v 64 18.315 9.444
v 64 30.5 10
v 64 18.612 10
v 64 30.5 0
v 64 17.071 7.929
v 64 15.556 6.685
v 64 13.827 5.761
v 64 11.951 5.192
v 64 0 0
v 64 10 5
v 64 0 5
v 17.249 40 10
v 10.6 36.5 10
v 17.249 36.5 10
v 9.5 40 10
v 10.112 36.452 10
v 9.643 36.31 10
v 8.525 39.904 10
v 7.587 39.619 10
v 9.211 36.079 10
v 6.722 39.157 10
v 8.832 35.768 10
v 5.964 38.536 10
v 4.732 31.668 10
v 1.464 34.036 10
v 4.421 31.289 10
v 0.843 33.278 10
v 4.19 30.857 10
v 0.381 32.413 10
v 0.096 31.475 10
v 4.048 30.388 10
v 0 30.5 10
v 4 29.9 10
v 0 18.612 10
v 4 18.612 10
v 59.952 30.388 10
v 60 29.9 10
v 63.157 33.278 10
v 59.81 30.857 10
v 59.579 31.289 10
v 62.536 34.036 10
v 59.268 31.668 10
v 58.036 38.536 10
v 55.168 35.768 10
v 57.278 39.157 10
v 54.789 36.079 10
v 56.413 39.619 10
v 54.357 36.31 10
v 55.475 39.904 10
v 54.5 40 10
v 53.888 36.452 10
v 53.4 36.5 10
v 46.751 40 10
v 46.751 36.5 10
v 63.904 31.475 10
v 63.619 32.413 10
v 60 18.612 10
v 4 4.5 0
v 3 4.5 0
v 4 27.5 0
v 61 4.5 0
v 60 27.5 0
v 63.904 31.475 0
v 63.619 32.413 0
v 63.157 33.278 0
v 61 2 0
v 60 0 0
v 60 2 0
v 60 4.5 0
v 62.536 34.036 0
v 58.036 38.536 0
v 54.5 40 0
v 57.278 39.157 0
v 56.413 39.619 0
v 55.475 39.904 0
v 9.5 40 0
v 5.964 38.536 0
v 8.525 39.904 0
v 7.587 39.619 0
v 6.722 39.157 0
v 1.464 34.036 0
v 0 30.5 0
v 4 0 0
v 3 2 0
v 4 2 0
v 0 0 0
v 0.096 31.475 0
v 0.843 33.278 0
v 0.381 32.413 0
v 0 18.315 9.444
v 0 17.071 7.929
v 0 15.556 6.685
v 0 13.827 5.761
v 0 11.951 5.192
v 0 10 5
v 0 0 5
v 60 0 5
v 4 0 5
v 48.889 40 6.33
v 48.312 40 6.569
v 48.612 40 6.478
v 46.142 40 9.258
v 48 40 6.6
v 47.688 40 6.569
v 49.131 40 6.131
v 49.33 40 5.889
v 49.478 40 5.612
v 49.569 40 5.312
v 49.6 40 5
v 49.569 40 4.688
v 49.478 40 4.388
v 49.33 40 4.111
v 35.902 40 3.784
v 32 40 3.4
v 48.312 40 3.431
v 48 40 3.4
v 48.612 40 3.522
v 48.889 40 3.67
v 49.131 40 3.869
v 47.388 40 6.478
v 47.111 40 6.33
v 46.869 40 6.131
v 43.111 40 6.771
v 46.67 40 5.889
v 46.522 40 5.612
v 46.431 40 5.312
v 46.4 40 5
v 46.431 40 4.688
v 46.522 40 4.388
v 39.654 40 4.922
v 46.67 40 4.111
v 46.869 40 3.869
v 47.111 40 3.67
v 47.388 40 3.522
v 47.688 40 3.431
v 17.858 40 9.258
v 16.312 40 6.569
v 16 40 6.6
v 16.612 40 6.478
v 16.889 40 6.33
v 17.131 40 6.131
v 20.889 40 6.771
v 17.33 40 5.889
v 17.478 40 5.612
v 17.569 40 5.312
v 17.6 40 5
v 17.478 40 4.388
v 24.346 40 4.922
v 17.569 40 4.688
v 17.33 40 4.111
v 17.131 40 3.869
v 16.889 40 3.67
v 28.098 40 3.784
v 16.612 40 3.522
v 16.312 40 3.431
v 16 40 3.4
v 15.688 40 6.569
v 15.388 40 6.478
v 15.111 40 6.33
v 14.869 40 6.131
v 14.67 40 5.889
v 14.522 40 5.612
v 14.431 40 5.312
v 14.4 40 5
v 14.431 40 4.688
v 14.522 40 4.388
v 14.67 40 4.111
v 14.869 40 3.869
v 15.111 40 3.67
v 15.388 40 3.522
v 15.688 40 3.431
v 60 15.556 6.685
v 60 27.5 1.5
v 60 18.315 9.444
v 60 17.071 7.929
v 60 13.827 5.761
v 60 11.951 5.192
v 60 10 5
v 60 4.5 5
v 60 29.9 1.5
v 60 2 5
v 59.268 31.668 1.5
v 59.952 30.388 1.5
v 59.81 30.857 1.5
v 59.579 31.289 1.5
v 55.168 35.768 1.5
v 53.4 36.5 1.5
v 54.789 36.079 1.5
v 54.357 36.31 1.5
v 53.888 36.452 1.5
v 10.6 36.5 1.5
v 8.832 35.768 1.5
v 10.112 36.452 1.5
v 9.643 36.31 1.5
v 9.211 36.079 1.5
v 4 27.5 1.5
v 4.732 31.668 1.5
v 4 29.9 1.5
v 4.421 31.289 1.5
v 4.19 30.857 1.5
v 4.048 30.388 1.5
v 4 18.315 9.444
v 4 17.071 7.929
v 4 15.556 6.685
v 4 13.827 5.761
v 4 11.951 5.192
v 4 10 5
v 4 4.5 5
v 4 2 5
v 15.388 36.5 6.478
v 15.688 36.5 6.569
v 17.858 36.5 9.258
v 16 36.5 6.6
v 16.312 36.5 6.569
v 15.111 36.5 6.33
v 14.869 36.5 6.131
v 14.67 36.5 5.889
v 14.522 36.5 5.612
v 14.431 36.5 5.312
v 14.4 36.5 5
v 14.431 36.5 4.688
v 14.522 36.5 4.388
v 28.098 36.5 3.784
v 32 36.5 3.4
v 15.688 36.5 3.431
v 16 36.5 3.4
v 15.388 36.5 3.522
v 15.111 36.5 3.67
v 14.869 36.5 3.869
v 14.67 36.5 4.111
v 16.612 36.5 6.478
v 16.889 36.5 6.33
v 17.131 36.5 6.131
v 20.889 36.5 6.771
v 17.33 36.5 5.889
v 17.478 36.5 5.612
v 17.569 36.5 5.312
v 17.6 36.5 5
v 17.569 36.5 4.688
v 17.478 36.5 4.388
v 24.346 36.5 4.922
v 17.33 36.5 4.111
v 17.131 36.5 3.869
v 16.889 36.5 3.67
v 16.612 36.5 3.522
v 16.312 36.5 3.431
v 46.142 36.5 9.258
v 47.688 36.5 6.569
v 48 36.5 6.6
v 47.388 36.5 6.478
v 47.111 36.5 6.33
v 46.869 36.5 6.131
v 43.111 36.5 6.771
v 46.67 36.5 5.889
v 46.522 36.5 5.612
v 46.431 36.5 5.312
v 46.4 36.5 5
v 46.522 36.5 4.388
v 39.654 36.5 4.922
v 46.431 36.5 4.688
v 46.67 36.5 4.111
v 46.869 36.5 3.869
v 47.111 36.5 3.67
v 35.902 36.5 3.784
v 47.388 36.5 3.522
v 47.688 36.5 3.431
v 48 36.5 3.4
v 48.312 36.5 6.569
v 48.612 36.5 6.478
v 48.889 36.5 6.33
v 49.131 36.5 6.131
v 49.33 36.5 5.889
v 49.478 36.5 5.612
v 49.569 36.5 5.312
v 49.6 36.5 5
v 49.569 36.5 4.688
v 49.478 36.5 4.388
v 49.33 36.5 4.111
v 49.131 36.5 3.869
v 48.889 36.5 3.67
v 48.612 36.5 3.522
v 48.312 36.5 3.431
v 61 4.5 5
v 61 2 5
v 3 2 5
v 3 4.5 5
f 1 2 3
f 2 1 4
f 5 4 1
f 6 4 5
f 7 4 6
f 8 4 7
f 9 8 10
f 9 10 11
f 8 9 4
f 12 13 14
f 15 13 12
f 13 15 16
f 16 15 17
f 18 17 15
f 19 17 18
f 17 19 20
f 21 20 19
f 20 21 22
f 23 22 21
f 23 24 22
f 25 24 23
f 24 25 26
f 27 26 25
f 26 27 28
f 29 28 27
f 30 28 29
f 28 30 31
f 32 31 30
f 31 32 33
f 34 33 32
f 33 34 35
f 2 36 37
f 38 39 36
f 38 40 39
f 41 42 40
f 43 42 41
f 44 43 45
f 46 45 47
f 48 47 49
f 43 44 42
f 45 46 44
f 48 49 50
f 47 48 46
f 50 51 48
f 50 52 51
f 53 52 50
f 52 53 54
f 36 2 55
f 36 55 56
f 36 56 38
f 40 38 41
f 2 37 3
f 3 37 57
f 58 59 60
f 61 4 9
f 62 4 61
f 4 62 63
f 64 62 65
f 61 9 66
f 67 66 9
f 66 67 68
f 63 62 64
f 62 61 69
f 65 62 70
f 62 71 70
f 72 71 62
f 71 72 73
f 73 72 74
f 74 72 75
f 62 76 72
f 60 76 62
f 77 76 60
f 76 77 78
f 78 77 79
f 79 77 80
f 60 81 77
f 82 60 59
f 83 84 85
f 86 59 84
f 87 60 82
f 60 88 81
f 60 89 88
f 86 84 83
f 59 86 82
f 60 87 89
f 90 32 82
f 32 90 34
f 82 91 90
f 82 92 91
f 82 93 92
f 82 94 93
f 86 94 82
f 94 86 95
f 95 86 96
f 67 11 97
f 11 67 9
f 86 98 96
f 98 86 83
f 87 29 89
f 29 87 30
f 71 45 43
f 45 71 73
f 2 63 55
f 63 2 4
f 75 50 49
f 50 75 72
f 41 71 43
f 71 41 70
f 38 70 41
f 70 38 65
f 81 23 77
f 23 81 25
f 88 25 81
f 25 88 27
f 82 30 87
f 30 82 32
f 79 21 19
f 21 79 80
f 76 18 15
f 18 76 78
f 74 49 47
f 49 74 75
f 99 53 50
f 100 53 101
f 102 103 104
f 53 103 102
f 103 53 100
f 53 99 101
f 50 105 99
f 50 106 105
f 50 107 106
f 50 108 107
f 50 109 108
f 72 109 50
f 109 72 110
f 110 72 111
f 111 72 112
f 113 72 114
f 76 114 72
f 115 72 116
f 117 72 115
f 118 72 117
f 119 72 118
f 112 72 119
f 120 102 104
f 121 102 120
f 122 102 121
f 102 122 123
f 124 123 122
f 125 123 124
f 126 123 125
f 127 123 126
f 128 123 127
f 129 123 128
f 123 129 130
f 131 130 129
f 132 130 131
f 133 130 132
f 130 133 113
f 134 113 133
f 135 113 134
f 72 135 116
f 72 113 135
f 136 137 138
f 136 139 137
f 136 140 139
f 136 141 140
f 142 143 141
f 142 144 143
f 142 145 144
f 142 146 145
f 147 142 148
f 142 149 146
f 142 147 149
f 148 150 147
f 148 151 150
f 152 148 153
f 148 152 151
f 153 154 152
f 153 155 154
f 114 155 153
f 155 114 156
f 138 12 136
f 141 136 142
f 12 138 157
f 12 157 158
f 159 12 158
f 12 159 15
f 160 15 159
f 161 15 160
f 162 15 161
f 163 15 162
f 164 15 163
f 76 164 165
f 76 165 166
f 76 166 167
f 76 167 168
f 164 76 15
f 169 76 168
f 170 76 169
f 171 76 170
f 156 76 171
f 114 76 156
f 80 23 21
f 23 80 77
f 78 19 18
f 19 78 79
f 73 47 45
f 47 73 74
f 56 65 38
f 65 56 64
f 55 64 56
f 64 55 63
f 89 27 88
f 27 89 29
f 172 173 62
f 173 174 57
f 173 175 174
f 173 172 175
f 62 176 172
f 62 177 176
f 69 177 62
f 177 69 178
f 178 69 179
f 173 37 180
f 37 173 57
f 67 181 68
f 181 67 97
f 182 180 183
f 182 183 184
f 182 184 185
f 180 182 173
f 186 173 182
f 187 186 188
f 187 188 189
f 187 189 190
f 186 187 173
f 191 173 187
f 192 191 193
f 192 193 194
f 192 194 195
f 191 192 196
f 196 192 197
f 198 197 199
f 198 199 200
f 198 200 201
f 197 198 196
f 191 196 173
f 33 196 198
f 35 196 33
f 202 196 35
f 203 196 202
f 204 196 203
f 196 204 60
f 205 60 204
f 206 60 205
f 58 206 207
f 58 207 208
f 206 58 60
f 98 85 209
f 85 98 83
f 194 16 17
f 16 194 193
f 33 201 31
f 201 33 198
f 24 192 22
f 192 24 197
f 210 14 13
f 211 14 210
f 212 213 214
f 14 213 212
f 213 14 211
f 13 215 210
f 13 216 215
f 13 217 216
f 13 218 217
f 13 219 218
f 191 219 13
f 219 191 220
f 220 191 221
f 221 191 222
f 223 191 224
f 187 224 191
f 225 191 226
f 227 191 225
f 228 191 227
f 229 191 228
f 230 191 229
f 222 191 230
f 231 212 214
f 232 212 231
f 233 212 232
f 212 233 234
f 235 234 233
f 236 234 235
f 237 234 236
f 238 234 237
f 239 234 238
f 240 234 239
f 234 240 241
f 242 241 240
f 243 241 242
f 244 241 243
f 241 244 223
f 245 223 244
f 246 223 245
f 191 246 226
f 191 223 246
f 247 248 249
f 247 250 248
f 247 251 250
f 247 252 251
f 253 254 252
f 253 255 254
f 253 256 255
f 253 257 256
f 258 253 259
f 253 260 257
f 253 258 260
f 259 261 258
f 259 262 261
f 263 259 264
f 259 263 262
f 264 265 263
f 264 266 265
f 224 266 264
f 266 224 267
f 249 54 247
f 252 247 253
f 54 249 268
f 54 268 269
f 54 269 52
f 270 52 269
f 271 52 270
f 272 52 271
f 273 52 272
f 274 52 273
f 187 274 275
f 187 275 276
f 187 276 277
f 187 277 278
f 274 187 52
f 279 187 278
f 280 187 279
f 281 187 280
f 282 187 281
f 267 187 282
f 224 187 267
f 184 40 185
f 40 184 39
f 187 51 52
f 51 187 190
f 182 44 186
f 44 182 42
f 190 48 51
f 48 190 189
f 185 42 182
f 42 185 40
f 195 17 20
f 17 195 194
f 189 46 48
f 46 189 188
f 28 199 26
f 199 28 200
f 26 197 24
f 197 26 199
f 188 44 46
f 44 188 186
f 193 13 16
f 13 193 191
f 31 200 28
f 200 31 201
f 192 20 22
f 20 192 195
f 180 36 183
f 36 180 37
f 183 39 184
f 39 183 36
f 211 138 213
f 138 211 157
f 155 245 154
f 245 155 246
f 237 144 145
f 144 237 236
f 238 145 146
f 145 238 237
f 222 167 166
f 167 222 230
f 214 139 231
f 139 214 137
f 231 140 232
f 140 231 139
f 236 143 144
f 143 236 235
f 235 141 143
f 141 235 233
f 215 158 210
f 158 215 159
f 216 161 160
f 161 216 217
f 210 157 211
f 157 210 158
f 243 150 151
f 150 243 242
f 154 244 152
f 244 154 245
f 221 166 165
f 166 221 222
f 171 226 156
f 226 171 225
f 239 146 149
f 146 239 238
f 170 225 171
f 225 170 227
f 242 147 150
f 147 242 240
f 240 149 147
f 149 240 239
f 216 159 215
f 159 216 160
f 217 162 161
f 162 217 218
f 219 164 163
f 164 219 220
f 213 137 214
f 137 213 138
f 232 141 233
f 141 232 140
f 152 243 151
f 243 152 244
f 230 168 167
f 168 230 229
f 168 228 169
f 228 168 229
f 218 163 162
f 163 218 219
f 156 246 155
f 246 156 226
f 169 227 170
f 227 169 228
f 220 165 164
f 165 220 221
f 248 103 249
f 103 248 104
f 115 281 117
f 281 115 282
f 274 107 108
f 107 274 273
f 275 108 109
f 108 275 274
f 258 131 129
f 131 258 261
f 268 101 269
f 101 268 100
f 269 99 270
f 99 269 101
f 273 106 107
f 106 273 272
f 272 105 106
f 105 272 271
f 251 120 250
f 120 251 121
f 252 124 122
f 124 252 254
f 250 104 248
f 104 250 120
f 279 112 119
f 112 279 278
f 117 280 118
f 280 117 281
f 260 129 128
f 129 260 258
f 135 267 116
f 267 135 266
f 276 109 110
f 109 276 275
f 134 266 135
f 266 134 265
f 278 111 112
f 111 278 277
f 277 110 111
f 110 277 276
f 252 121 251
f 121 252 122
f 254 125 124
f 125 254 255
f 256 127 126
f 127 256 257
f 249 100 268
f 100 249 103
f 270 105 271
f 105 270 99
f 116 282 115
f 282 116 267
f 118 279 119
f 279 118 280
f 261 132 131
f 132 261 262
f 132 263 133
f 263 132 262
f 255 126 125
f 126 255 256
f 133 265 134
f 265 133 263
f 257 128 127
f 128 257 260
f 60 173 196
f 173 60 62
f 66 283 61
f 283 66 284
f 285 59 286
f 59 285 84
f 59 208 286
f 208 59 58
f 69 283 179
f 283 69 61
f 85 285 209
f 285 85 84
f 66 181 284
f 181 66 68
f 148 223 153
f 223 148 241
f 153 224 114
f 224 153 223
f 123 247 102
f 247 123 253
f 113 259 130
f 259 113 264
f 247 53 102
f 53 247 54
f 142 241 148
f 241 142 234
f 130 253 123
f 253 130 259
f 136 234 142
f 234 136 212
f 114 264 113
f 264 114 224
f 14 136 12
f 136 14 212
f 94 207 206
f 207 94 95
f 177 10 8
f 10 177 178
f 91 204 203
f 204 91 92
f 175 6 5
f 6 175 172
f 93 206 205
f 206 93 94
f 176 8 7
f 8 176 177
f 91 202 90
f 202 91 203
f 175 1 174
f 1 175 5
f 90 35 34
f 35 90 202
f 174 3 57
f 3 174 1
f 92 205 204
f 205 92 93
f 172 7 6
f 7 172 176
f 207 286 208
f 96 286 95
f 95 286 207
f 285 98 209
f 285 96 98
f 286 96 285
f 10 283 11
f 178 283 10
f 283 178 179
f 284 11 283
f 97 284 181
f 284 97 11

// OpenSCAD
// RAMPS Fan Mount
// Licence: CC BY-SA 3.0, http://creativecommons.org/licenses/by-sa/3.0/
// Author: Dominik Scholz <schlotzz@schlotzz.com> and contributors
// visit: http://www.schlotzz.com


module ramps_fan_mount_cutoff_cube(width, height, depth, cutoff = 5, radius = 5)
{
	union()
	{
		cube([width, height - cutoff - radius, depth]);

		hull()
		{
			for (x = [radius, width - radius])
				translate([x, height - cutoff - radius, 0])
					cylinder(r = radius, h = depth);
	
			for (x = [radius + cutoff, width - radius - cutoff])
				translate([x, height - radius, 0])
					cylinder(r = radius, h = depth);
		}
	}
}


module ramps_fan_mount(width = 64, height = 40, depth = 10, fanDia = 40, fanHoleDia = 3.2, fanHoleDist = 32, grooveDepth = 0.5, grooveHeight = 2.5, thickness = 3.5, $fn = 16)
{

	difference()
	{
		// base corpus
		ramps_fan_mount_cutoff_cube(width, height, depth, cutoff = 4.5, radius = 5);

		// hollow, leave side air guide
		translate([thickness+0.5, -thickness, 1.5])
			ramps_fan_mount_cutoff_cube(width - 2 * thickness-1, height, depth + 2, cutoff = 4.1, radius = 2.5);

		// remove unneeded air guide
		translate([thickness+0.5, -1, -1])
			cube([width - 2 * thickness-1, height - thickness - 8, depth + 2]);

		// add grooves
		translate([thickness - grooveDepth, 2, -1])
			cube([width - 2 * thickness + grooveDepth * 2, grooveHeight, depth + 2]);
		
		// fan mounting holes
		for (x = [(width - fanHoleDist) / 2, (width + fanHoleDist) / 2])
			translate([x, height + 1, depth / 2])
				rotate([90, 0, 0])
					cylinder(r = fanHoleDia / 2, h = thickness + 2);

		// fan hole
		translate([width / 2, height + 1, depth / 2 + fanDia / 2 - fanHoleDia / 2])
			rotate([90, 0, 0])
				cylinder(r = fanDia / 2, h = thickness + 2);

		// smaller legs
		translate([-1, height / 2 - depth, depth * 1.5])
			rotate([0, 90, 0])
				cylinder(r = depth, h = width + 2);
		translate([-1, -1, depth / 2])
			cube([width + 2, height / 2 - depth + 1, depth / 2 + 1]);

	}

}


ramps_fan_mount($fn = 32);
